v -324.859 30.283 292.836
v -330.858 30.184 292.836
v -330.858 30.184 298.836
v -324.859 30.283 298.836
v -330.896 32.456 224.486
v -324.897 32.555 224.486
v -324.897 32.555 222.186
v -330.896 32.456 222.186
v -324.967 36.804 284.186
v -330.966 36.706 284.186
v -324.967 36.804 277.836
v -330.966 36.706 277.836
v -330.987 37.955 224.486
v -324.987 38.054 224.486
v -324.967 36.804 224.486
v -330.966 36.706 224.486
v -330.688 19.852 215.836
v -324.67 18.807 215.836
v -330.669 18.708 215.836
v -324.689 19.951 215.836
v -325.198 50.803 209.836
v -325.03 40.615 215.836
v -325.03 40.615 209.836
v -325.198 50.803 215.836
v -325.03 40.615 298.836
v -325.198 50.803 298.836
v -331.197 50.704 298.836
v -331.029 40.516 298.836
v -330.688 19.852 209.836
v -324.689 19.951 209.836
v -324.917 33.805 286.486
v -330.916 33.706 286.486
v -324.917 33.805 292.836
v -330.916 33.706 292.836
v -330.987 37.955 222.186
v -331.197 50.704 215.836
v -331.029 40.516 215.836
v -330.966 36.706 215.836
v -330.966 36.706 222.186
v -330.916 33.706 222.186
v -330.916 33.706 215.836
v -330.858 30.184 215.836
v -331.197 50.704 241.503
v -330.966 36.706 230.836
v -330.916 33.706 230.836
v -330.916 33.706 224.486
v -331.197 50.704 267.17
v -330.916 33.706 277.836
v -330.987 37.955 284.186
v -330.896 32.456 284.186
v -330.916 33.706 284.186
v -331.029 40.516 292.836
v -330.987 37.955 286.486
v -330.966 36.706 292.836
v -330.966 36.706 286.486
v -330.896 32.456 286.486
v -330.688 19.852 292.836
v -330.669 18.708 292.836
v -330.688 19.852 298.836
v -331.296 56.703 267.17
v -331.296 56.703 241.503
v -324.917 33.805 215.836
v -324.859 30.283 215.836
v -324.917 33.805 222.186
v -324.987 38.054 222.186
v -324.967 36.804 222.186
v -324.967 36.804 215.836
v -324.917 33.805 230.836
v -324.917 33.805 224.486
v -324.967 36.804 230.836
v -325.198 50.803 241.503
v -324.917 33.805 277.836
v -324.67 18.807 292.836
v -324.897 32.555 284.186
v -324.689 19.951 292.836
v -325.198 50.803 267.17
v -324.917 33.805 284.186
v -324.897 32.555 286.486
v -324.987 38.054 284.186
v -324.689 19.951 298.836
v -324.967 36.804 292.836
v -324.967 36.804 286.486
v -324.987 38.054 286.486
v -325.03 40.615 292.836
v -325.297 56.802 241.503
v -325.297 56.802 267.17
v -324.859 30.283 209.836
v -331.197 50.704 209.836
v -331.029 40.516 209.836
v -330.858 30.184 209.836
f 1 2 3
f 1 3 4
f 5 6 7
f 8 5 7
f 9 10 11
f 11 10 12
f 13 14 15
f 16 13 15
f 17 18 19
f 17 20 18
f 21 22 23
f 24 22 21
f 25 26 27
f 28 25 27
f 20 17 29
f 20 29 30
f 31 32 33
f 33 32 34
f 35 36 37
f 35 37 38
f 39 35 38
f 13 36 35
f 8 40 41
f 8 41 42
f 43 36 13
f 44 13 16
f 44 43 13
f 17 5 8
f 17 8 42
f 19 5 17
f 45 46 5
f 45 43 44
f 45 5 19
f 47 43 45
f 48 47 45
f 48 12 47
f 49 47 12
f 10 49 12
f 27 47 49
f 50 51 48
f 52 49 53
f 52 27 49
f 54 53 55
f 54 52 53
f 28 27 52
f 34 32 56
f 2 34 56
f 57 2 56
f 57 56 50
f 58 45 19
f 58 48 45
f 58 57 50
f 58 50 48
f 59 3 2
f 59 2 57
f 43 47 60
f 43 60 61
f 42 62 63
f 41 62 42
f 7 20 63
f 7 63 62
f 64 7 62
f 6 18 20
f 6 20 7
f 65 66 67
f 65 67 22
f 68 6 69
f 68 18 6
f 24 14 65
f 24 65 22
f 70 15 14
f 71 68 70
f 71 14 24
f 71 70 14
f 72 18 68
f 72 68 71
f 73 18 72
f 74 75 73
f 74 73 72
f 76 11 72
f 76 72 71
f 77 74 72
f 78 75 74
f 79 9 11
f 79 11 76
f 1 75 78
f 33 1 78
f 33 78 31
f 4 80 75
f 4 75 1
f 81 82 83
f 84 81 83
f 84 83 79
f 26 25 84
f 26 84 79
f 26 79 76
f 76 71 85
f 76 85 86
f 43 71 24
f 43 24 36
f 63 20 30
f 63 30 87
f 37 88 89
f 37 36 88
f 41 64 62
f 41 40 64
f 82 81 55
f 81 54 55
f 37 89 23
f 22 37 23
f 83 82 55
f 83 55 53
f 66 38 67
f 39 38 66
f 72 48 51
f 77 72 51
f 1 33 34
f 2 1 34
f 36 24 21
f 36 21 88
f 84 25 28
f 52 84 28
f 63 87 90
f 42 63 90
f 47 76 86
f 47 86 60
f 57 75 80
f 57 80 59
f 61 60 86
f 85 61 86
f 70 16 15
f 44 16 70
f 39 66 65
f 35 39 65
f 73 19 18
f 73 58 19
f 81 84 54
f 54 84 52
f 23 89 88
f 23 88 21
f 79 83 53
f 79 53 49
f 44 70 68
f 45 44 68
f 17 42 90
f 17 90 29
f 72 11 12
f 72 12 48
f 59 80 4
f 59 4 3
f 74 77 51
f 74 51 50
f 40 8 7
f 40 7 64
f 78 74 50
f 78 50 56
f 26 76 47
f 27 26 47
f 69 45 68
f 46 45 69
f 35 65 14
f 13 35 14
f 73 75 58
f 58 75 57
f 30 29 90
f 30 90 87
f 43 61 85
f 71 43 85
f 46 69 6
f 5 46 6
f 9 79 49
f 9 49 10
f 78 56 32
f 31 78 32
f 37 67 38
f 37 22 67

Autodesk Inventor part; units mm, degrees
ref_plane "YZ Plane" through (0, 0, 0) normal (1, 0, 0) x (0, 1, 0)
ref_plane "XZ Plane" through (0, 0, 0) normal (0, 1, 0) x (-1, 0, 0)
ref_plane "XY Plane" through (0, 0, 0) normal (0, 0, 1) x (1, 0, 0)
ref_plane "РабПлоскость1" through (-327.803629, 8.784154, 215.836479) normal (0, 0, 1) x (1, 0, 0)
sketch "Эскиз1" plane through (-327.803629, 8.784154, 215.836479) normal (0, 0, 1) x (1, 0, 0)
  line L0 (3.114831, 11.166777) -> (2.944416, 21.498705)
  line L1 (2.944416, 21.498705) -> (-3.054768, 21.399754)
  line L2 (-3.054768, 21.399754) -> (-2.884353, 11.067826)
  line L3 (-2.884353, 11.067826) -> (3.114831, 11.166777)
  line L4 (-3.393221, 41.919489) -> (-3.225183, 31.731682)
  line L5 (2.774001, 31.830633) -> (2.605963, 42.01844)
  line L6 (-3.225183, 31.731682) -> (2.774001, 31.830633)
  line L7 (2.605963, 42.01844) -> (-3.393221, 41.919489)
  line L8 (2.774001, 31.830633) -> (2.605963, 42.01844) construction
  line L9 (-3.393221, 41.919489) -> (-3.225183, 31.731682) construction
  line L10 (3.114831, 11.166777) -> (2.944416, 21.498705) construction
  line L11 (-3.054768, 21.399754) -> (-2.884353, 11.067826) construction
  line L12 (6.149374, 48.077701) -> (19.433282, 48.296806) construction
  line L13 (2.605963, 42.01844) -> (6.248325, 42.078517) construction
  point P0 (327.803629, -8.784154)
  dimension "d16" = 6
extrude "Выдавливание1" add sketch "Эскиз1" against normal blind 6
ref_plane "РабПлоскость2" through (-327.498735, 8.403036, 292.836479) normal (0, 0, -1) x (-0.999864, -0.0164918, 0)
sketch "Эскиз2" plane through (-327.498735, 8.403036, 292.836479) normal (0, 0, -1) x (-0.999864, -0.0164918, 0)
  line L0 (-3, 21.833317) -> (3, 21.833317)
  line L1 (3, 21.833317) -> (3, 11.499984)
  line L2 (3, 11.5) -> (-3, 11.5)
  line L3 (-3, 11.499984) -> (-3, 21.833317)
  line L4 (3, 32.16665) -> (-3, 32.16665)
  line L5 (-3, 32.16665) -> (-3, 42.355843)
  line L6 (-3, 42.5) -> (3, 42.5)
  line L7 (3, 42.355843) -> (3, 32.16665)
  line L8 (-3, 11.499984) -> (-3, 21.833317) construction
  line L9 (3, 21.833317) -> (3, 11.499984) construction
  line L10 (-3, 32.16665) -> (-3, 42.355843) construction
  line L11 (3, 42.355843) -> (3, 32.16665) construction
  point P0 (-327.315615, -13.802923)
sketch "Эскиз2 outline for Выдавливание2" plane through (-327.498735, 8.403036, 292.836479) normal (0, 0, -1) x (-0.999864, -0.0164918, 0)
  line L0 (3, 32.16665) -> (3, 42.355843)
  line L1 (-3, 32.16665) -> (3, 32.16665)
  line L2 (-3, 42.355843) -> (-3, 32.16665)
  line L3 (3, 42.355843) -> (-3, 42.355843)
  line L4 (-3, 21.833317) -> (-3, 11.499984)
  line L5 (3, 21.833317) -> (-3, 21.833317)
  line L6 (3, 11.499984) -> (3, 21.833317)
  line L7 (-3, 11.499984) -> (3, 11.499984)
extrude "Выдавливание2" add sketch "Эскиз2 outline for Выдавливание2" against normal blind 6
sketch "Эскиз3" plane through (-327.498735, 8.403036, 292.836479) normal (0, 0, -1) x (-0.999864, -0.0164918, 0)
  circle A0 centre (0, -7.644157) radius 18
  line L0 (6.642857, 42.355843) -> (3, 42.355843)
  line L1 (-3, 32.166667) -> (-3, 21.833333)
  line L2 (-3, 21.833333) -> (3, 21.833333)
  line L3 (3, 21.833333) -> (3, 32.166667)
  line L4 (3, 32.166667) -> (-3, 32.166667)
  line L5 (-3, 42.355843) -> (3, 42.355843)
  line L6 (3, 42.355843) -> (3, 10.355843)
  line L7 (3, 10.355843) -> (-3, 10.355843)
  line L8 (-3, 10.355843) -> (-3, 42.355843)
  point P0 (-327.315615, -13.802923)
  point P1 (-3, 21.833333)
  point P2 (3, 21.833333)
  point P3 (3, 42.355843)
extrude "Выдавливание3" add sketch "Эскиз3" along normal up to surface (77 mm away) contours L7 L8 L2 L6 | L2 L1 L4 L3 | L4 L8 L5 L6
sketch "Эскиз4" plane through (-331.19685, 50.703643, 209.836479) normal (-0.999864, -0.0164918, 0) x (0, 0, 1)
  line L0 (0, -14) -> (6, -14) construction
  line L1 (0, -17) -> (6, -17) construction
  line L2 (6, -17) -> (6, -14)
  line L3 (6, -14) -> (12.35, -14)
  line L4 (12.35, -14) -> (12.35, -12.75)
  line L5 (12.35, -12.75) -> (14.65, -12.75)
  line L6 (14.65, -12.75) -> (14.65, -14)
  line L7 (14.65, -14) -> (21, -14)
  line L8 (21, -14) -> (21, -17)
  line L9 (21, -17) -> (14.65, -17)
  line L10 (14.65, -17) -> (14.65, -18.25)
  line L11 (14.65, -18.25) -> (12.35, -18.25)
  line L12 (12.35, -18.25) -> (12.35, -17)
  line L13 (12.35, -17) -> (6, -17)
  line L14 (0, -20.522506) -> (0, -30.855843) construction
  line L15 (89, -10.189193) -> (89, 0) construction
  line L16 (0, -30.855843) -> (89, 0) construction
  line L17 (44.5, 0) -> (44.5, -30.855843) construction
  line L18 (89, -14) -> (83, -14) construction
  line L19 (89, -17) -> (83, -17) construction
  line L20 (83, -17) -> (83, -14)
  line L21 (83, -14) -> (76.65, -14)
  line L22 (76.65, -14) -> (76.65, -12.75)
  line L23 (76.65, -12.75) -> (74.35, -12.75)
  line L24 (74.35, -12.75) -> (74.35, -14)
  line L25 (74.35, -14) -> (68, -14)
  line L26 (68, -14) -> (68, -17)
  line L27 (68, -17) -> (74.35, -17)
  line L28 (74.35, -17) -> (74.35, -18.25)
  line L29 (74.35, -18.25) -> (76.65, -18.25)
  line L30 (76.65, -18.25) -> (76.65, -17)
  line L31 (76.65, -17) -> (83, -17)
  point P0 (-209.836479, -56.158766)
  point P1 (44.5, -15.427922)
  dimension "d9" = 2.3
  dimension "d10" = 5.5
  dimension "d11" = 15
extrude "Выдавливание4" cut sketch "Эскиз4" against normal blind 6
sketch "Эскиз5" plane through (-331.19685, 50.703643, 292.636479) normal (-0.0164918, 0.999864, 0) x (0.999864, 0.0164918, 0)
  line L0 (6, 51.133333) -> (6, 25.466667)
  line L1 (0, 51.133333) -> (6, 51.133333)
  line L2 (0, 25.466667) -> (0, 51.133333)
  line L3 (6, 25.466667) -> (0, 25.466667)
  point P0 (330.315615, 292.636479)
extrude "Выдавливание5" add sketch "Эскиз5" along normal blind 6
equation "\"d1\" = d0"
equation "\"d3\" = d0"
equation "\"d7\" = d0"
equation "\"d12\" = d3"
equation "\"d14\" = d0"
equation "\"d0\" = d16"
properties part number "Korpus 6"
